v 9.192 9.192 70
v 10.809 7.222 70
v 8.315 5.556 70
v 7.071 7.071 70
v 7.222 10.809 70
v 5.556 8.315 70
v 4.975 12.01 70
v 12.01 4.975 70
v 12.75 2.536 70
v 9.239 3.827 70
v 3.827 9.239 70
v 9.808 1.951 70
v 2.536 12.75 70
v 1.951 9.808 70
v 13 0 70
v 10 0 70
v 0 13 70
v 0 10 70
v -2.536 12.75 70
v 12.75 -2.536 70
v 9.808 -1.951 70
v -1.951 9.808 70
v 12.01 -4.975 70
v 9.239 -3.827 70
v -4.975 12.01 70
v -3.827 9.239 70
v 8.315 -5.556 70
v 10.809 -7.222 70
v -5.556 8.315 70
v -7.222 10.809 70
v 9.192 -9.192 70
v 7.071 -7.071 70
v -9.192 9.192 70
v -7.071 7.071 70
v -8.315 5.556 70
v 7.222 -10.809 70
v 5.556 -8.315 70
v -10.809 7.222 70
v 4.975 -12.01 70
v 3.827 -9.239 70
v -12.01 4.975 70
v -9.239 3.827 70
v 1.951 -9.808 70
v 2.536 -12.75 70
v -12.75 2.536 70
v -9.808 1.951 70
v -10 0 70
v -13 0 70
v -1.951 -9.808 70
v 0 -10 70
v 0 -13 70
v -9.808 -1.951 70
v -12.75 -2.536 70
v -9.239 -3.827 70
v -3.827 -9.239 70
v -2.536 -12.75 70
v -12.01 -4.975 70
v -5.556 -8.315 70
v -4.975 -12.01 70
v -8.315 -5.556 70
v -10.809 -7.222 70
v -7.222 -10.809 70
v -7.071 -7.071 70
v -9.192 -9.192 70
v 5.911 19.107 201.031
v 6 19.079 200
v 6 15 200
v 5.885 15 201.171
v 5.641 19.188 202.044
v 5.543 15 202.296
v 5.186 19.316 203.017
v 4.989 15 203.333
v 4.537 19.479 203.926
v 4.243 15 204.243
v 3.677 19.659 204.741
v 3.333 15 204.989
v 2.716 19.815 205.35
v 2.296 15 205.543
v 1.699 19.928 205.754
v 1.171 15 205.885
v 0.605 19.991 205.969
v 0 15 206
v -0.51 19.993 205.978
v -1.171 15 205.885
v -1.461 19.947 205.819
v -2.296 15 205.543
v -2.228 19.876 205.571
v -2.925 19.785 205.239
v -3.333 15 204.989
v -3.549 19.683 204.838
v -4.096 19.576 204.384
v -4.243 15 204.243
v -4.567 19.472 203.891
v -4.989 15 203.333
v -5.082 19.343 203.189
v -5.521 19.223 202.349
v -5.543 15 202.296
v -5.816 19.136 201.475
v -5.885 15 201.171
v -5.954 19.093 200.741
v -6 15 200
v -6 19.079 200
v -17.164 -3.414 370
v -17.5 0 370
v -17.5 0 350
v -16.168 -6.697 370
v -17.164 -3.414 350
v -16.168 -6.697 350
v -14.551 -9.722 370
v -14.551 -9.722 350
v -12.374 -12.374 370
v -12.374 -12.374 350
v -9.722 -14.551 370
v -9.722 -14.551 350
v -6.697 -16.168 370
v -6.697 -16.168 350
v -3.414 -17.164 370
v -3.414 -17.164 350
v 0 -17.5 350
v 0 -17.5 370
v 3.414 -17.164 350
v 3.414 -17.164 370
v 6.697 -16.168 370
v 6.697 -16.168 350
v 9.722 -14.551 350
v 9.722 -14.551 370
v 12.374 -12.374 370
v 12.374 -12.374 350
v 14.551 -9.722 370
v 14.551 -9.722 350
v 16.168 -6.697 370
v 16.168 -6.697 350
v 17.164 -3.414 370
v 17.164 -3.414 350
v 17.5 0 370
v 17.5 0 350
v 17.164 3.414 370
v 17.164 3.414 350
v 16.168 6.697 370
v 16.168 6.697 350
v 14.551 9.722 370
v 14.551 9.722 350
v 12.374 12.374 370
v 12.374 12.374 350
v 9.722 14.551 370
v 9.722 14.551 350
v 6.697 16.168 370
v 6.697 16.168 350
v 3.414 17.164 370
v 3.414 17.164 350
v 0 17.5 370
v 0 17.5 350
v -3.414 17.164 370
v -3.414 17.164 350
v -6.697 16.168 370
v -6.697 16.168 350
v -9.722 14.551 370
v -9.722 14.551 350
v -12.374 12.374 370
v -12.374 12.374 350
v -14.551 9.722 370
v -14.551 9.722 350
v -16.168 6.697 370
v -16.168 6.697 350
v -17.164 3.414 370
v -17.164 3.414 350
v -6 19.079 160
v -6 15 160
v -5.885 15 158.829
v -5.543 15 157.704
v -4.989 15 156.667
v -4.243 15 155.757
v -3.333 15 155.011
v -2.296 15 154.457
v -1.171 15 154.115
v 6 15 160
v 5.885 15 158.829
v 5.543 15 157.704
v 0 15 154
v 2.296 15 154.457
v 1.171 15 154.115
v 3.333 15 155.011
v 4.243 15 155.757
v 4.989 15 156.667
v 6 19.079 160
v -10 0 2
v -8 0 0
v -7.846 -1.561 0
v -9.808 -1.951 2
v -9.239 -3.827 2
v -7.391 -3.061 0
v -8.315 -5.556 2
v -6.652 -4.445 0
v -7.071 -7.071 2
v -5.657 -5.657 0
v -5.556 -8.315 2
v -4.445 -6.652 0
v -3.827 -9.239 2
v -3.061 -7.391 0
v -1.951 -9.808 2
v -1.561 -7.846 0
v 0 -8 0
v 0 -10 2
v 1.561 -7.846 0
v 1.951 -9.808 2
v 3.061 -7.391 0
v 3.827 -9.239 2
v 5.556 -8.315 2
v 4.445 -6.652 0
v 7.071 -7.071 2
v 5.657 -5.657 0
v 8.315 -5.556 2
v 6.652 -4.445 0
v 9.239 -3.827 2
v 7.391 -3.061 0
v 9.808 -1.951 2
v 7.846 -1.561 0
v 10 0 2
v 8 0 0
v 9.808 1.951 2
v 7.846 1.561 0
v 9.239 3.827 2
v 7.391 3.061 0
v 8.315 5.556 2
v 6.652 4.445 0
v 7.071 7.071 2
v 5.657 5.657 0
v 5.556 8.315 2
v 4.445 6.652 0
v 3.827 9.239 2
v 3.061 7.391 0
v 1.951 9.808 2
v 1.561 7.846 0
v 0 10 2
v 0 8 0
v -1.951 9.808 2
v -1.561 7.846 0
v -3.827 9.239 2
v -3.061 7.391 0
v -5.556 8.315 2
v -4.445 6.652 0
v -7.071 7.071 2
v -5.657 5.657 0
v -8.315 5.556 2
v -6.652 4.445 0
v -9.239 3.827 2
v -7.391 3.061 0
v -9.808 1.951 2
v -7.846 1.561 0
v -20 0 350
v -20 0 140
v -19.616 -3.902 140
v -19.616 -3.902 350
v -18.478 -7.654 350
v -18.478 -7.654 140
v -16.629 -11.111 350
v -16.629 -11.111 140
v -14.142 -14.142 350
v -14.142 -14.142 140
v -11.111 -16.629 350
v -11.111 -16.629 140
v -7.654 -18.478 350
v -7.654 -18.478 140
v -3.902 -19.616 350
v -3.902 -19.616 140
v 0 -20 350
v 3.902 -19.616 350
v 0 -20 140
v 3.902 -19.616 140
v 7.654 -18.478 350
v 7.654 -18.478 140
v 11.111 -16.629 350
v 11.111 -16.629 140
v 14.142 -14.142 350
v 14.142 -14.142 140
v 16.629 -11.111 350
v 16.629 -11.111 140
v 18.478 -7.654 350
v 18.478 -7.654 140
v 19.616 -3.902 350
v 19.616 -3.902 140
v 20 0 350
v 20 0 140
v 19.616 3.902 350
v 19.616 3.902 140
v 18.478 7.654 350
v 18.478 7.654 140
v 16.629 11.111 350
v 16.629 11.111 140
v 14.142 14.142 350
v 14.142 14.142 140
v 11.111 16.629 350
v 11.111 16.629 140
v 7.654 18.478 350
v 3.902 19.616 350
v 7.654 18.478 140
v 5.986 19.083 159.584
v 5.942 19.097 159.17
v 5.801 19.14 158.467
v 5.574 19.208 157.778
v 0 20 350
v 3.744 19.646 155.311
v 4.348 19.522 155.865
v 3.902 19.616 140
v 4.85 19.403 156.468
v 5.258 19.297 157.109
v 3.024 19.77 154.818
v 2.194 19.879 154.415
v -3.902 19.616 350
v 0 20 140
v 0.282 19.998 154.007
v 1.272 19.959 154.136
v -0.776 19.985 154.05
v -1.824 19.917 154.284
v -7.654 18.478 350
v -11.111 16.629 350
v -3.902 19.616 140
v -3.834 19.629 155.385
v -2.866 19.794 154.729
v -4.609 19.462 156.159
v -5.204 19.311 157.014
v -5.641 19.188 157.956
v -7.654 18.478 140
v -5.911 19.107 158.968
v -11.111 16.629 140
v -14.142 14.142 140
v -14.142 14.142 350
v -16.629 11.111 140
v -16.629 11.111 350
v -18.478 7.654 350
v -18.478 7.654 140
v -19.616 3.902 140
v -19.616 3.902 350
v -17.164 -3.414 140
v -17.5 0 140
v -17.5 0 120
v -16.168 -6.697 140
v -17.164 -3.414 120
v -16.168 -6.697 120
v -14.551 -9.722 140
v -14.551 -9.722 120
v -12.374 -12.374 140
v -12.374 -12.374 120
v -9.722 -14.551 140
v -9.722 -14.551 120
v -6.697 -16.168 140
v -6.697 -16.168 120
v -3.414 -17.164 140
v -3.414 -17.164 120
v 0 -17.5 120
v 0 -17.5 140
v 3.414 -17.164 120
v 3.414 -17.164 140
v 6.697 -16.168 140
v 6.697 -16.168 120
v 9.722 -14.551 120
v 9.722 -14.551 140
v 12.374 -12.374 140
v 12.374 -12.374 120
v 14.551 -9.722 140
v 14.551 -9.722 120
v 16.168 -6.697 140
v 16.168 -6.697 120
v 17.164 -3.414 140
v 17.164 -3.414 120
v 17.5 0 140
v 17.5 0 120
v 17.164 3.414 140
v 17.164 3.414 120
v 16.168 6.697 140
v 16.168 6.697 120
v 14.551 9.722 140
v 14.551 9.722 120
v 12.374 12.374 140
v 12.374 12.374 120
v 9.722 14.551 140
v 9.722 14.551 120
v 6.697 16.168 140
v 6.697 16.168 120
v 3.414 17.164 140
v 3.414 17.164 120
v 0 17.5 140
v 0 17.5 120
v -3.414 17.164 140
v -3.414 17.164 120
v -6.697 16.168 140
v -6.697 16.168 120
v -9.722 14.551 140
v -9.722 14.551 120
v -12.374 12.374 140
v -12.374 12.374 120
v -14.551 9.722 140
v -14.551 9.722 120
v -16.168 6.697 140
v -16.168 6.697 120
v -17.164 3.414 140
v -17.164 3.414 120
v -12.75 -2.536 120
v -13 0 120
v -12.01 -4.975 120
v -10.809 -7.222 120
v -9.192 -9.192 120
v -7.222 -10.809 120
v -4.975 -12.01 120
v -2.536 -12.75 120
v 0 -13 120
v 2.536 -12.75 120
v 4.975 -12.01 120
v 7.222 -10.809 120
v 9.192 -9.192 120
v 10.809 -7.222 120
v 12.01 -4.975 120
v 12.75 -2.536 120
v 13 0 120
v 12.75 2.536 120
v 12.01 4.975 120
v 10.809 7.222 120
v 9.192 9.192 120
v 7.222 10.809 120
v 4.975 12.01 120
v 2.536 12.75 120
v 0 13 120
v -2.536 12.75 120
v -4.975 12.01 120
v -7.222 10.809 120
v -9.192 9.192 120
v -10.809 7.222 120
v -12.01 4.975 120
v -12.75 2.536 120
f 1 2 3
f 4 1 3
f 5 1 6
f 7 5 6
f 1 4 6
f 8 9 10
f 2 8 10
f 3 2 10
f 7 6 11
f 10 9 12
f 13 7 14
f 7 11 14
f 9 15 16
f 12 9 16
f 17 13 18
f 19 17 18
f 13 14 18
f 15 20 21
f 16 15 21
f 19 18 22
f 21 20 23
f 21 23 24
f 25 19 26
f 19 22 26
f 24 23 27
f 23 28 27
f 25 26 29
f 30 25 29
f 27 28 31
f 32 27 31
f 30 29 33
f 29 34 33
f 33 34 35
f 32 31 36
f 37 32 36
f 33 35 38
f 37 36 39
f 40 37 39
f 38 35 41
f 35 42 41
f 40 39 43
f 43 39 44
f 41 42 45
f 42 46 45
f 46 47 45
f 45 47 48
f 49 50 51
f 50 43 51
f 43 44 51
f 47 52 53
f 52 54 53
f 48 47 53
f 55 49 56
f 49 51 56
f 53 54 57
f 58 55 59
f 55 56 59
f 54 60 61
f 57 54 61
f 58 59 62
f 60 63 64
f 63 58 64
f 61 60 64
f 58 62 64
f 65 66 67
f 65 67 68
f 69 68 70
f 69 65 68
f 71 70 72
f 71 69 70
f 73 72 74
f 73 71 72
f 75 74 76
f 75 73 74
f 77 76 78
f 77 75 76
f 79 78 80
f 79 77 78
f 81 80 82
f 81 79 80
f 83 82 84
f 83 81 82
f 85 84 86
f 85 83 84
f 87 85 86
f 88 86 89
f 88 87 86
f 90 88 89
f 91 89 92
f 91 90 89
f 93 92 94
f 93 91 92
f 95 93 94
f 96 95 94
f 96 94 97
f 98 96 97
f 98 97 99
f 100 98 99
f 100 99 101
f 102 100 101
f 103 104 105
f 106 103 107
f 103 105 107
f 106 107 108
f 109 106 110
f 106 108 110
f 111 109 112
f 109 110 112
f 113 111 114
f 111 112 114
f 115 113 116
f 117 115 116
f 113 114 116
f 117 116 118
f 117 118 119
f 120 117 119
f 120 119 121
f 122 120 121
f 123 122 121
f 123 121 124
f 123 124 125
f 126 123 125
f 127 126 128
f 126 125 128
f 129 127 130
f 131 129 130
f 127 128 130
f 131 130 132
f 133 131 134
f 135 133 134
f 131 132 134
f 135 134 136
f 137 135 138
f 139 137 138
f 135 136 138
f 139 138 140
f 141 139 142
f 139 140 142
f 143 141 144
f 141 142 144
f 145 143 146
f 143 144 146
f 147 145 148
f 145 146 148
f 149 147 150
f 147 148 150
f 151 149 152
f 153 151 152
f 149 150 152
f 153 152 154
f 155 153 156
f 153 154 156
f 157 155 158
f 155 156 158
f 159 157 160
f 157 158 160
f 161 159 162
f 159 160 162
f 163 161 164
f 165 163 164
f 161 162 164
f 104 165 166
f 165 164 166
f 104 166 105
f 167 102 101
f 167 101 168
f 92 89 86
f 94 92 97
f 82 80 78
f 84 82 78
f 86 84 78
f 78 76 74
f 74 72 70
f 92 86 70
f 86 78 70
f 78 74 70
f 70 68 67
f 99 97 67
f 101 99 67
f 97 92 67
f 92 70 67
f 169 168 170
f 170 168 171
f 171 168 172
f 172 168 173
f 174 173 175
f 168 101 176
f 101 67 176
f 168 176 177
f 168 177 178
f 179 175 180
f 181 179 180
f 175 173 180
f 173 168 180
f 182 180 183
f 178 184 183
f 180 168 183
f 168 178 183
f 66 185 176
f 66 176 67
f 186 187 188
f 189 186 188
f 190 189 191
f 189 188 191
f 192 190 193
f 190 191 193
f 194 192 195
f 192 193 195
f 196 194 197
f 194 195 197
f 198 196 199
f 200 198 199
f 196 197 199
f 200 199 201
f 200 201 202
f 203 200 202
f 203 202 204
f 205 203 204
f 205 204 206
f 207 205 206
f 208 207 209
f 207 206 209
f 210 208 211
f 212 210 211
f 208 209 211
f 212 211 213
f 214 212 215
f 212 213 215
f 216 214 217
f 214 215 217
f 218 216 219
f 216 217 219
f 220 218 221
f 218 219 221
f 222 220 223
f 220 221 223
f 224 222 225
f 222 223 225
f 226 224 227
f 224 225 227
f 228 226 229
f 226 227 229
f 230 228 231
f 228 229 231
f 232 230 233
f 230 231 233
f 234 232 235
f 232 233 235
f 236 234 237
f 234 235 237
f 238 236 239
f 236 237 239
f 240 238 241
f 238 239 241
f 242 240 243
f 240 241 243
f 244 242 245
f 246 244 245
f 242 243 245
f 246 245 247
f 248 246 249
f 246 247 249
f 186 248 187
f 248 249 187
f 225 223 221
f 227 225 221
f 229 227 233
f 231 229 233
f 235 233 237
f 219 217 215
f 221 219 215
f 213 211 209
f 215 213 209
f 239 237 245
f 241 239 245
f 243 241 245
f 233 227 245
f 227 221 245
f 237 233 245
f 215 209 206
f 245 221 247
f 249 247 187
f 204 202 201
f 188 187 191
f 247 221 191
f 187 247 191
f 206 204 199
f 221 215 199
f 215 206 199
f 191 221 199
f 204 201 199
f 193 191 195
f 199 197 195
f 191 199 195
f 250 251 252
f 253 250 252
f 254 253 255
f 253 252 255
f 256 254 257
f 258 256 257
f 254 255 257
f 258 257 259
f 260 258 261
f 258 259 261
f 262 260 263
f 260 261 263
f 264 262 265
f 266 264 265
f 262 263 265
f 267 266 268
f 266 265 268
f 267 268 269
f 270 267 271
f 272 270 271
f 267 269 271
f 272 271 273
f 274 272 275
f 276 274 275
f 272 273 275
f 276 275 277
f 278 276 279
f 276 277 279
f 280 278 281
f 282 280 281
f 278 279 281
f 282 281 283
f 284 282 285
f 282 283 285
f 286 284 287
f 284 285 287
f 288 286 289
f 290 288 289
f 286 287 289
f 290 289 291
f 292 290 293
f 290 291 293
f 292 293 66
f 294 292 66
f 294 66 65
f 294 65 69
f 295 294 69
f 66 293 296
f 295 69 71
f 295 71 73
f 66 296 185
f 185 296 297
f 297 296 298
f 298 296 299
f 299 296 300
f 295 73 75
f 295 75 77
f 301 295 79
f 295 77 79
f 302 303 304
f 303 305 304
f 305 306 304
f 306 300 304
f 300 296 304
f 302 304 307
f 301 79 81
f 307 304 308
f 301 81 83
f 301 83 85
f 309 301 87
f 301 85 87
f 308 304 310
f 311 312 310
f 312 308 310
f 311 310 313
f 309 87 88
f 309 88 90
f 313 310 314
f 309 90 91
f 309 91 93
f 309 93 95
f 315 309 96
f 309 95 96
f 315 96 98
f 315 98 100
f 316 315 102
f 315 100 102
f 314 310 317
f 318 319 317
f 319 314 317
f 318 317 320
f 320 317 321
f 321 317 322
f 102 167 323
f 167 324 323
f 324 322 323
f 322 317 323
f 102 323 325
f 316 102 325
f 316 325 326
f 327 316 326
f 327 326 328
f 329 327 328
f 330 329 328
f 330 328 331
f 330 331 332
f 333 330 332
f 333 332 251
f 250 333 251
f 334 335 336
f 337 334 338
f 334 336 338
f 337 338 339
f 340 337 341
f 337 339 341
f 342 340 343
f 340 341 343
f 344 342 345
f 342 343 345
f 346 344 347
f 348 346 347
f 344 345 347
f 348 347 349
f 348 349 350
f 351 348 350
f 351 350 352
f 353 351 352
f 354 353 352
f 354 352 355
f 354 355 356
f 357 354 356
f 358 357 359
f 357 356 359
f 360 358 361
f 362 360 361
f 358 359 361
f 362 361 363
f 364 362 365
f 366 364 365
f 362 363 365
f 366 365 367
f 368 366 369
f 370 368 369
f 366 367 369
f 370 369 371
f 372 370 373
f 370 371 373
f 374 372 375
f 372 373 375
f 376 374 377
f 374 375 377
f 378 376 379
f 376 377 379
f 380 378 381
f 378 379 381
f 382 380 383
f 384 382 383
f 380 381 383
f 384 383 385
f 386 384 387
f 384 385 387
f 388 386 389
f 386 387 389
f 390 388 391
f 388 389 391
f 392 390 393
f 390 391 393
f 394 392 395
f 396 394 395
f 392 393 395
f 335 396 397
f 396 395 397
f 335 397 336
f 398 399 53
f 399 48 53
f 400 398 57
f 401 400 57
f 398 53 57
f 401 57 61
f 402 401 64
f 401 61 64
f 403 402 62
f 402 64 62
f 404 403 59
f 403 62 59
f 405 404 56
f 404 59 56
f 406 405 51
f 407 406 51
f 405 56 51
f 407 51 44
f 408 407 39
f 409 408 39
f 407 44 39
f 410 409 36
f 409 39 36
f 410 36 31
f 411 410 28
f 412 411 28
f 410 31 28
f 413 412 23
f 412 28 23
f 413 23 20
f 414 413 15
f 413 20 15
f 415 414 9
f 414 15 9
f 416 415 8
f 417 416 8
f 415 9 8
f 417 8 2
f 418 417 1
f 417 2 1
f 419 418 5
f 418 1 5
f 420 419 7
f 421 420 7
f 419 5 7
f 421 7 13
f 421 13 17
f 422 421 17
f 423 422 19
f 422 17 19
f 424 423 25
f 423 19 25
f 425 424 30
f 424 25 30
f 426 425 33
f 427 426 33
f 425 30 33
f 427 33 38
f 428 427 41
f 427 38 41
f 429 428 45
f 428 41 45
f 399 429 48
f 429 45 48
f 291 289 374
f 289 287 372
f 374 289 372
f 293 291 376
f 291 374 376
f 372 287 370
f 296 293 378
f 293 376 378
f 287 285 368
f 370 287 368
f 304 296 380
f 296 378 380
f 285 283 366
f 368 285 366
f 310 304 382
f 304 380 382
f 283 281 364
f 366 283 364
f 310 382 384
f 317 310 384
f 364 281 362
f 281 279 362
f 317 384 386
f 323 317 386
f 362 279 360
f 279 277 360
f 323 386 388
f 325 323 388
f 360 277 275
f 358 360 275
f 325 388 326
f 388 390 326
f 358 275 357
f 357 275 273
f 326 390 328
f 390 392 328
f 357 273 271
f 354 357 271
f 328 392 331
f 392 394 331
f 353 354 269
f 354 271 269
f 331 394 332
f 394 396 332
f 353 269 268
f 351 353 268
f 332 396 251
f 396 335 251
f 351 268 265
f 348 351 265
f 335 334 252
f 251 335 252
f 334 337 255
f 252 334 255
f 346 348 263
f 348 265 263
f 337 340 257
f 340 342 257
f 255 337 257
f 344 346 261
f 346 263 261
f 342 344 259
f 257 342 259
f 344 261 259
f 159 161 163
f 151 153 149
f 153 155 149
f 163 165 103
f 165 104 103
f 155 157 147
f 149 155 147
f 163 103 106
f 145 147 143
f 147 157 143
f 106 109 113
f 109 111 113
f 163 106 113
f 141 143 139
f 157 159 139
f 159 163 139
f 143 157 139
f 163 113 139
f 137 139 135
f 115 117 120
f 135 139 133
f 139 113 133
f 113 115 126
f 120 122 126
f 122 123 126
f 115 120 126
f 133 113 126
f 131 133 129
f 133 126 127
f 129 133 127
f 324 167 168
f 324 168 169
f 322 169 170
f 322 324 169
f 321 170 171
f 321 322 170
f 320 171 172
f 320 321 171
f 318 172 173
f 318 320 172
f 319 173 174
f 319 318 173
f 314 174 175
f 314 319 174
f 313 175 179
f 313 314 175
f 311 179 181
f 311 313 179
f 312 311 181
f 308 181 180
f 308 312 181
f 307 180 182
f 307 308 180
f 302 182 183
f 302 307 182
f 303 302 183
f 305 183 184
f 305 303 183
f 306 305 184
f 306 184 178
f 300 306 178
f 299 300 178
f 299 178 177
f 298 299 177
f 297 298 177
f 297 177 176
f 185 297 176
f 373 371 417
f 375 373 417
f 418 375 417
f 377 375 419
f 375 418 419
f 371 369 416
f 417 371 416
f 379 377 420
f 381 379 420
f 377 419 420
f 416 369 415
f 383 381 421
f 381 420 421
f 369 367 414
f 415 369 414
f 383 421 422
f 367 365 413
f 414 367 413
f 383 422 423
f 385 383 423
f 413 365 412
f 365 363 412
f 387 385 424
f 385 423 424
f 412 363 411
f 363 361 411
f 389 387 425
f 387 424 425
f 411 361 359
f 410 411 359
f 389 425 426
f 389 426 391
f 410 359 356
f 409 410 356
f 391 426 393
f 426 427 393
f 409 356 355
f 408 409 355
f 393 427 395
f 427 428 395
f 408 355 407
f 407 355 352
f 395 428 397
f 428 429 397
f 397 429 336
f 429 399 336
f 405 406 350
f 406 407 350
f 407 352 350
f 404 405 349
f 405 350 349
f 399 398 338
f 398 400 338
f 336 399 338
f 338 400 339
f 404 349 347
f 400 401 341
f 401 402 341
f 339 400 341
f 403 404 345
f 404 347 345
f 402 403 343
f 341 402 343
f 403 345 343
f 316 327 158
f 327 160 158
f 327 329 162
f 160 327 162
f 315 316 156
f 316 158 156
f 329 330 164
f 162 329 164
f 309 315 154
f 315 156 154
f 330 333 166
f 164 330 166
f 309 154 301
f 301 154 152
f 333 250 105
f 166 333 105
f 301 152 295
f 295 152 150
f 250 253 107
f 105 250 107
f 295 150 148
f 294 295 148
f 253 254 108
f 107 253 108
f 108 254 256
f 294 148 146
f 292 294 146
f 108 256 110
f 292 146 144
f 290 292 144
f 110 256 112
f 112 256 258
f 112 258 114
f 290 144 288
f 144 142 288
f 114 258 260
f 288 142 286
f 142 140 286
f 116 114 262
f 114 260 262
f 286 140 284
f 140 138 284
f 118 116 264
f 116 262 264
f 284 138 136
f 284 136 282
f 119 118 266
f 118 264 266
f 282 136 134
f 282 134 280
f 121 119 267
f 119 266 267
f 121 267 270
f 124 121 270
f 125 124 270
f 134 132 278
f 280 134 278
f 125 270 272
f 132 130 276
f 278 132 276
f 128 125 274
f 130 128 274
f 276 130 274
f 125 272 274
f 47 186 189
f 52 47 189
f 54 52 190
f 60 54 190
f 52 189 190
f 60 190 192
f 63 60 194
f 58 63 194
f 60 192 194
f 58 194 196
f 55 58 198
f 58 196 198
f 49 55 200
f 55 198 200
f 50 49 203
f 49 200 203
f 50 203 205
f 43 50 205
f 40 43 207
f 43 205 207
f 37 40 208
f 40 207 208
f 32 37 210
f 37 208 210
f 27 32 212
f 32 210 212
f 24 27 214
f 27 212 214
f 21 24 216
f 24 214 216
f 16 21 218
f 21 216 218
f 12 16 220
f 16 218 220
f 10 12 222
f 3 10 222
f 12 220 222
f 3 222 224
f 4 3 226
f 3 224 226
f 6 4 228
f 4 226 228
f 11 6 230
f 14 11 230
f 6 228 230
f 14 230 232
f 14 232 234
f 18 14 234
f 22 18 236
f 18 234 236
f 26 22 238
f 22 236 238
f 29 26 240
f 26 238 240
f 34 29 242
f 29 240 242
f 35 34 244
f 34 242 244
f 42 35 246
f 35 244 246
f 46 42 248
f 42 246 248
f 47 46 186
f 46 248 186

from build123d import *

# Parameters (mm, degrees)
CUT_EXTRUDE1_DEPTH = 5
CHAMFER1_SIZE      = 2


with BuildPart() as part:
    # Sketch1 → Revolve1 (revolve)
    with BuildSketch(Plane(origin=(0, 0, 0), x_dir=(1, 0, 0), z_dir=(0, 1, 0)), mode=Mode.PRIVATE) as revolve1_sk:
        Polygon((0, 0), (0, -370), (17.5, -370), (17.5, -350), (20, -350), (20, -140), (17.5, -140), (17.5, -120), (13, -120), (13, -70), (10, -70), (10, 0), align=None)
    revolve(revolve1_sk.sketch.rotate(Axis((0, 0, 0), (0, 0, 1)), 180), axis=Axis((0, 0, 0), (0, 0, 1)))

    # Sketch3 → Cut-Extrude1 (cut)
    with BuildSketch(Plane(origin=(-7.563219115, 20, 140), x_dir=(0, 0, -1), z_dir=(0, -1, 0))):
        with BuildLine():
            Line((-20, 13.563219115), (-60, 13.563219115))
            ThreePointArc((-60, 13.563219115), (-66, 7.563219115), (-60, 1.563219115))
            Line((-60, 1.563219115), (-20, 1.563219115))
            ThreePointArc((-20, 1.563219115), (-14, 7.563219115), (-20, 13.563219115))
        make_face()
    extrude(amount=CUT_EXTRUDE1_DEPTH, mode=Mode.SUBTRACT)

    # Chamfer1
    chamfer1_edges = [part.edges().sort_by_distance(p)[0] for p in [
        (10, 0, 0),
    ]]
    chamfer(chamfer1_edges, length=CHAMFER1_SIZE)


solid = part.part
